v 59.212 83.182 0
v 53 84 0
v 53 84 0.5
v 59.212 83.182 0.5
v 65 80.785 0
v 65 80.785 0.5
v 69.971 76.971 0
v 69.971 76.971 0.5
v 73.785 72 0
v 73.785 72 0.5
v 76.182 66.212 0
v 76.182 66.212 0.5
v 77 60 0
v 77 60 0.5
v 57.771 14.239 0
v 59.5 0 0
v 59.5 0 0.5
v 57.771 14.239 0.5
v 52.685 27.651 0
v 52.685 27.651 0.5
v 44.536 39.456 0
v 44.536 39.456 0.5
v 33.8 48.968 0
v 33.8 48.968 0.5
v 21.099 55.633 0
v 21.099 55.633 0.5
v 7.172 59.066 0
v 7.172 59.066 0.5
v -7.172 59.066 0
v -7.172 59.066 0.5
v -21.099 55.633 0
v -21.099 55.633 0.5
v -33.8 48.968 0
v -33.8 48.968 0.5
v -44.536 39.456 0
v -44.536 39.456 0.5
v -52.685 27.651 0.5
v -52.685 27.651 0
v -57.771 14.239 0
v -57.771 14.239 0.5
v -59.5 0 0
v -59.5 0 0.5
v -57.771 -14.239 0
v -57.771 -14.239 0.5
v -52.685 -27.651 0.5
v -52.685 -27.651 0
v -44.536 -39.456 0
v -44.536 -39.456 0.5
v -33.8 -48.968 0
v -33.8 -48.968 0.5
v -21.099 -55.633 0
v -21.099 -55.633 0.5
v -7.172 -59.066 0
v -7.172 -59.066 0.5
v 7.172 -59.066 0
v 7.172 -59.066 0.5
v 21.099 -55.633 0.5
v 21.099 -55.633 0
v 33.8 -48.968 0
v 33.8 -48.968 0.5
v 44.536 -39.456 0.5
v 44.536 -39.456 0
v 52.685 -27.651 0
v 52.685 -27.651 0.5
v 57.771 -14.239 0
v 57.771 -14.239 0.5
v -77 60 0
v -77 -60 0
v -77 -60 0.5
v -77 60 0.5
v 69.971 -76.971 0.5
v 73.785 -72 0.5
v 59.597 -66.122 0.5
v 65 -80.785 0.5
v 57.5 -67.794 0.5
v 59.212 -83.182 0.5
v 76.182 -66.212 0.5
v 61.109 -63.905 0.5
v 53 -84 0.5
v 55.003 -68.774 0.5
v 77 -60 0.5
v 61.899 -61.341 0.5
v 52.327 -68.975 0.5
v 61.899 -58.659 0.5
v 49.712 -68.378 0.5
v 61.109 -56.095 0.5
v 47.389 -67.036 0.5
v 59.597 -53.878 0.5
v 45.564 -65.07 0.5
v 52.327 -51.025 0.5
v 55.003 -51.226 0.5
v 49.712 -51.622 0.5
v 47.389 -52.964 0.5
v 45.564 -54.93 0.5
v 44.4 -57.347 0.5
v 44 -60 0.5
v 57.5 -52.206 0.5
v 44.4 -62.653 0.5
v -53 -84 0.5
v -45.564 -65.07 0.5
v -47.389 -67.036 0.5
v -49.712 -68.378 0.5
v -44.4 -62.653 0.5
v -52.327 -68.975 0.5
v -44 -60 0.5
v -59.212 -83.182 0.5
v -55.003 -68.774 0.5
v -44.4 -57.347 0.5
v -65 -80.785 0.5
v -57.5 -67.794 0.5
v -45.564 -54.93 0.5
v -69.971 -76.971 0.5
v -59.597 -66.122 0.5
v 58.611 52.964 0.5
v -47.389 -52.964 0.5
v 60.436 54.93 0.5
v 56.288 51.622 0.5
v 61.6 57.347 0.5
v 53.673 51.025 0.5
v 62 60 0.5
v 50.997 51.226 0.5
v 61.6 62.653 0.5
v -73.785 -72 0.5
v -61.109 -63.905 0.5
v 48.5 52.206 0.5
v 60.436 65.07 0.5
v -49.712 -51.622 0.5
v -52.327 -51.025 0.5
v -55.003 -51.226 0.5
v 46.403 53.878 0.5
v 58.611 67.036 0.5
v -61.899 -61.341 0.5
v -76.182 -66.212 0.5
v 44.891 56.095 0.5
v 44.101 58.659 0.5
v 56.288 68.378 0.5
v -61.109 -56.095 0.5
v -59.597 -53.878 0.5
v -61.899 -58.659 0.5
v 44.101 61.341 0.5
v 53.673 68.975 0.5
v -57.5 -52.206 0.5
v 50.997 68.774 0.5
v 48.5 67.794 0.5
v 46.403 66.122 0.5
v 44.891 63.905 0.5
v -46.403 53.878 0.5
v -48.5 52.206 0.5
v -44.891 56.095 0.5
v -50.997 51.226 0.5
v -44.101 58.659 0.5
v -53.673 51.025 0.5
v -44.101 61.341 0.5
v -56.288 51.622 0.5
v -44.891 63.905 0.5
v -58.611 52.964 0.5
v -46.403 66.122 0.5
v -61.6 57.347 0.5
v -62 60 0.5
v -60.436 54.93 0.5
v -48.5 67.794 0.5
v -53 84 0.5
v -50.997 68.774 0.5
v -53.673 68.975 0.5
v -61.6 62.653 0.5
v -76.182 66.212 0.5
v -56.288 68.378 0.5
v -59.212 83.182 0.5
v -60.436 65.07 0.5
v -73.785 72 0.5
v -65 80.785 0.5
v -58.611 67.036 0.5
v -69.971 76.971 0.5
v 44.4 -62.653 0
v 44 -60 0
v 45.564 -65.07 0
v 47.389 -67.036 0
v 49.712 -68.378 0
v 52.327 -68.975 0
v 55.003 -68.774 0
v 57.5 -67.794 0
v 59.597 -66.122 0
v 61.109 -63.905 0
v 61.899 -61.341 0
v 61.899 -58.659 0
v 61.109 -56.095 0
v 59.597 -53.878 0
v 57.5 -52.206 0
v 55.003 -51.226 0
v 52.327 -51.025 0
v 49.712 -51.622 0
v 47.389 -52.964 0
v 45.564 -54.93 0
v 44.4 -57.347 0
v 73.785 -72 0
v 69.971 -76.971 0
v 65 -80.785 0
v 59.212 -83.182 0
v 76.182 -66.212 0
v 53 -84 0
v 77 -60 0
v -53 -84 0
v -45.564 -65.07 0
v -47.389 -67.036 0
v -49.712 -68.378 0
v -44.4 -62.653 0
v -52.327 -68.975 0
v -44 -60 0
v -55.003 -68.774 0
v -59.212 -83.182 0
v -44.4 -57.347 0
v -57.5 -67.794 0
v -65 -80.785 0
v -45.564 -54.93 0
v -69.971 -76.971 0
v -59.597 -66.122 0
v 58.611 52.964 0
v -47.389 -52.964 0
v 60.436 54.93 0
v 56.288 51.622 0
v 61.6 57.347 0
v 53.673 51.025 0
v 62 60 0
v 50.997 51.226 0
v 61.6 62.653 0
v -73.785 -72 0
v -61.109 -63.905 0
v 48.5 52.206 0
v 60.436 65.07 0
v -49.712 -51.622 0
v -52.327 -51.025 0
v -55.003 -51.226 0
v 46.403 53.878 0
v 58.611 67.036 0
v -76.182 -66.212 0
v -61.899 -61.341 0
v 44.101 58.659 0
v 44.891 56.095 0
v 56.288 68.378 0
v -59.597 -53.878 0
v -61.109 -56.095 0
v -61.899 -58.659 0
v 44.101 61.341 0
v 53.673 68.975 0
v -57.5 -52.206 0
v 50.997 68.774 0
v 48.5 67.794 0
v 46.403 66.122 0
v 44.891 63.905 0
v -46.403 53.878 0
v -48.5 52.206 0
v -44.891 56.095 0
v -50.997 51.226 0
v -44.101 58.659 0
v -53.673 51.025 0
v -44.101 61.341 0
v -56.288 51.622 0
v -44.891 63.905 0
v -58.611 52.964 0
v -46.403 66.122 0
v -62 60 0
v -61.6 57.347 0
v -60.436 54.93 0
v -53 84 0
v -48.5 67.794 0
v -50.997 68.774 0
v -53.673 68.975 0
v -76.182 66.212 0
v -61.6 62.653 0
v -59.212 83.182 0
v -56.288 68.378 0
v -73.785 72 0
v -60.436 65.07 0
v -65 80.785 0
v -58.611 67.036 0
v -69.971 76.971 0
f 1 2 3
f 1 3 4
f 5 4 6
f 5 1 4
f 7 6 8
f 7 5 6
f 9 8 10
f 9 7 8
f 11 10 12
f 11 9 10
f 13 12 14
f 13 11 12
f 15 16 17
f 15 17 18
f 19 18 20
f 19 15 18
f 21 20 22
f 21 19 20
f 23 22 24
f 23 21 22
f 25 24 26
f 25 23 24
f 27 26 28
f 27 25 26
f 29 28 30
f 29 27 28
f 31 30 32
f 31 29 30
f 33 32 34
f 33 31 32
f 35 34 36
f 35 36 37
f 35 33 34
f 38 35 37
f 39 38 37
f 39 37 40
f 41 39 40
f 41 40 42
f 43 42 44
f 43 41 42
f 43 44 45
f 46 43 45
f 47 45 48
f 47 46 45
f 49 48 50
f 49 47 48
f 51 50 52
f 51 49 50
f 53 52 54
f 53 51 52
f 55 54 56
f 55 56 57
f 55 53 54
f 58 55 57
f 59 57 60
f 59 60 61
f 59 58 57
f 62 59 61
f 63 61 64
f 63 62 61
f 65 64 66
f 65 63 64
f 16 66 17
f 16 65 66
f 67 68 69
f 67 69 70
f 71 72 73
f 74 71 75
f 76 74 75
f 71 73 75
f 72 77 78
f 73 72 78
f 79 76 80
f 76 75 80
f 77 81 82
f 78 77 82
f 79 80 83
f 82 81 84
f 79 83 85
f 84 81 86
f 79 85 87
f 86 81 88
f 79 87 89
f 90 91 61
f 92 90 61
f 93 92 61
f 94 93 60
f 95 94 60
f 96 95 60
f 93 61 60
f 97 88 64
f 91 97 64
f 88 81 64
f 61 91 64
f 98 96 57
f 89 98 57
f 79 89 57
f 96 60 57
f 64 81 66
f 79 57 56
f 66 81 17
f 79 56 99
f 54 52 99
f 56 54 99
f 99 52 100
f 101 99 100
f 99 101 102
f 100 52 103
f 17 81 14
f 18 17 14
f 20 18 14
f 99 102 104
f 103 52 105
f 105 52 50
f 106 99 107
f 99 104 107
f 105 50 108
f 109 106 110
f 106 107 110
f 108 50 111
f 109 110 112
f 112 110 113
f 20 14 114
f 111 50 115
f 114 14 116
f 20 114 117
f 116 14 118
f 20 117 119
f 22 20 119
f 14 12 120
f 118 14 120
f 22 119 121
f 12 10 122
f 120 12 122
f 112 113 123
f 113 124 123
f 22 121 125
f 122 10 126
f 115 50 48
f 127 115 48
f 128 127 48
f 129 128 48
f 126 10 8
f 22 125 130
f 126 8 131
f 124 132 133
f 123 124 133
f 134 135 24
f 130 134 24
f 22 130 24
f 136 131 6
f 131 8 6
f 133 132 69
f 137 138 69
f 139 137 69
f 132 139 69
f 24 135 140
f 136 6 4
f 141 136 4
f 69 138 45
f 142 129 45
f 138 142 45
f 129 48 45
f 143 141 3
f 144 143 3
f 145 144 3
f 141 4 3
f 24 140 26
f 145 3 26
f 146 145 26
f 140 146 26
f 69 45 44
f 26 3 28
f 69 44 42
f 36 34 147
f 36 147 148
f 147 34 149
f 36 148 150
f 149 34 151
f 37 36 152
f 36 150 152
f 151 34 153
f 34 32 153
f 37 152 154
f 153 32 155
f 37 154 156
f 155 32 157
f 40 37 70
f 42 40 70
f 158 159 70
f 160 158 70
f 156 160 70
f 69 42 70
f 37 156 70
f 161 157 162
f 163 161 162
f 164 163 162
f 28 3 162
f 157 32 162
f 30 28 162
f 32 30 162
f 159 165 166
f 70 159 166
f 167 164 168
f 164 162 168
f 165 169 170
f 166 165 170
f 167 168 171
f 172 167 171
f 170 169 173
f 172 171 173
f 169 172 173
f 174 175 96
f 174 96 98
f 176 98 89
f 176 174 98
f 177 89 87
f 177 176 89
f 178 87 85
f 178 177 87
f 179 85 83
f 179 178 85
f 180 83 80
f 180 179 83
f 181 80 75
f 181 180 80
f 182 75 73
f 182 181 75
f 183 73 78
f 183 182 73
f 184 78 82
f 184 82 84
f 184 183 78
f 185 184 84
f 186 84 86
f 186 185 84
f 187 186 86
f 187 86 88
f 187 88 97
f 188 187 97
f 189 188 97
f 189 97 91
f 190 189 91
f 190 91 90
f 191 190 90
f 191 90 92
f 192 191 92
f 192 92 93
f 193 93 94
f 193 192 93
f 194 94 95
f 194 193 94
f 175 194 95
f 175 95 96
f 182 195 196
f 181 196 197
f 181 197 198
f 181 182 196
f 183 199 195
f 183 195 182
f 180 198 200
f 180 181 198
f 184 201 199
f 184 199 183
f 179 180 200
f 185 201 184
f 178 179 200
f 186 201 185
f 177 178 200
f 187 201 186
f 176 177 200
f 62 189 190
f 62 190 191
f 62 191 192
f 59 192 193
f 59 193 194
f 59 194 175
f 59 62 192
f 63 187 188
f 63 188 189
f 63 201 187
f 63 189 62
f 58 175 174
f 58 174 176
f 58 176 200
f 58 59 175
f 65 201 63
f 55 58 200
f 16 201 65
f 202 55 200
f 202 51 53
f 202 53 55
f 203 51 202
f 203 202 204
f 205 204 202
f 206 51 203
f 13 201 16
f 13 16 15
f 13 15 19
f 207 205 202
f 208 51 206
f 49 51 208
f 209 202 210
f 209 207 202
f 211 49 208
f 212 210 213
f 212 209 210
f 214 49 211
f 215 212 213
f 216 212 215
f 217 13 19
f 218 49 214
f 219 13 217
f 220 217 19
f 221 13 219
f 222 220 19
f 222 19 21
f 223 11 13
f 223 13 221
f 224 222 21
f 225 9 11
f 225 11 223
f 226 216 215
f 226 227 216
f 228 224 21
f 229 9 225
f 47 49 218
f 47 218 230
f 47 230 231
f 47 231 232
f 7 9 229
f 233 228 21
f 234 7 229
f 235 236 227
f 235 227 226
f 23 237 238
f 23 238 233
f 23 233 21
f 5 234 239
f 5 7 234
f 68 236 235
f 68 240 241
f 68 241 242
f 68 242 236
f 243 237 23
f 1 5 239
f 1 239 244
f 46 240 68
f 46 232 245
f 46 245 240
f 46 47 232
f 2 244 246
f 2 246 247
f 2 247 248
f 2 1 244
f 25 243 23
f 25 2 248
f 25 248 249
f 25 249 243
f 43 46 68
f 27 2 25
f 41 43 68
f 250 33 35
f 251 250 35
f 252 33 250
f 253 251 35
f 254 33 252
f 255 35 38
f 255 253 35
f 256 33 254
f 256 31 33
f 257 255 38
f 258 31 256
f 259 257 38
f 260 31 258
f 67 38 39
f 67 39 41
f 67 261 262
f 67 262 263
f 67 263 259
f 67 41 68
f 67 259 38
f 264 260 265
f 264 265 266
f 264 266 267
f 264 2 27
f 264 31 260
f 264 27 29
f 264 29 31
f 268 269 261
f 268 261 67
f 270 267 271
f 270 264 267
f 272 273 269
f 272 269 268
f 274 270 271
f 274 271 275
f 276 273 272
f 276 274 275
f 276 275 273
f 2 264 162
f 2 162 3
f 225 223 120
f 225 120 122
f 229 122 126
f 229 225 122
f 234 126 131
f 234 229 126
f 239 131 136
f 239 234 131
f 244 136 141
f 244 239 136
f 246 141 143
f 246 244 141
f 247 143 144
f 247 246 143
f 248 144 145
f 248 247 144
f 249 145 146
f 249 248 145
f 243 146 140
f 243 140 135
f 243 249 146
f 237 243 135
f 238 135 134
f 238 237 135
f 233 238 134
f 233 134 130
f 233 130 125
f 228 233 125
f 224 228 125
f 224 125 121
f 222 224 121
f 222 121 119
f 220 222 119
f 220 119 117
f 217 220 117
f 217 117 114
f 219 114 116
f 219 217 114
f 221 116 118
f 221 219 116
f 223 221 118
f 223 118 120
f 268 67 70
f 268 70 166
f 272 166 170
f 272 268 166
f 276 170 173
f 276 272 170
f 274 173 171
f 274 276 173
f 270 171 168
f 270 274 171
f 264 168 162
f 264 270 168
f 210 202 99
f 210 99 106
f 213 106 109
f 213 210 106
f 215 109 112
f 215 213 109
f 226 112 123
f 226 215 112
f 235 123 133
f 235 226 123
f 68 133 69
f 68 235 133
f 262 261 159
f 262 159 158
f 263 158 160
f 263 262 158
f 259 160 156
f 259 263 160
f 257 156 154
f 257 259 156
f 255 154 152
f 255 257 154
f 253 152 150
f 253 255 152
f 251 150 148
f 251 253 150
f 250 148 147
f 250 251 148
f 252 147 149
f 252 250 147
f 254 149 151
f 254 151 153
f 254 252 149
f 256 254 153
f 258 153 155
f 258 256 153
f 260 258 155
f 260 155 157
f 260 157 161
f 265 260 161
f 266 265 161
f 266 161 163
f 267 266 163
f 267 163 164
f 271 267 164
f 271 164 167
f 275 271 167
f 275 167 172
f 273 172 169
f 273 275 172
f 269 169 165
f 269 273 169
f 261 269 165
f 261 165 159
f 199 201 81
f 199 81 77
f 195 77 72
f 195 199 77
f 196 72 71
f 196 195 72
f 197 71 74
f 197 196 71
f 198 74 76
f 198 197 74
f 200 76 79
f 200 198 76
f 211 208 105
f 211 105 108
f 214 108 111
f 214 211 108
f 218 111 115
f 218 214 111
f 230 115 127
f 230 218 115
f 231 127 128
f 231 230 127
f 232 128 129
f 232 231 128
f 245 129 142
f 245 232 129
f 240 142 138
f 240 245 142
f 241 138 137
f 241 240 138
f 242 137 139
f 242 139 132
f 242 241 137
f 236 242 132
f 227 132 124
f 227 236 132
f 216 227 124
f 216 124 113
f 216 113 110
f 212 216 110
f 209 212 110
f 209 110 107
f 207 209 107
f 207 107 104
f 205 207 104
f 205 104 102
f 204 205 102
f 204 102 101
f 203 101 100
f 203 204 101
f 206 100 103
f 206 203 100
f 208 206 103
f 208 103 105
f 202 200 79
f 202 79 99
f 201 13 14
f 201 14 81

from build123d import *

# Parameters (mm, degrees)
SKETCH1_R           = 9
SKETCH1_R_2         = 59.5
BOSS_EXTRUDE1_DEPTH = 0.5


with BuildPart() as part:
    # Sketch1 → Boss-Extrude1 (new body)
    with BuildSketch(Plane.XY):
        with BuildLine():
            Line((-53, 84), (53, 84))
            ThreePointArc((53, 84), (69.970562748, 76.970562748), (77, 60))
            Line((77, 60), (77, -60))
            ThreePointArc((77, -60), (69.970562748, -76.970562748), (53, -84))
            Line((53, -84), (-53, -84))
            ThreePointArc((-53, -84), (-69.970562748, -76.970562748), (-77, -60))
            Line((-77, -60), (-77, 60))
            ThreePointArc((-77, 60), (-69.970562748, 76.970562748), (-53, 84))
        make_face()
        with Locations((53, 60)):
            Circle(SKETCH1_R, mode=Mode.SUBTRACT)
        with Locations(Location((-53, 60, 0), (0, 0, 180))):
            Circle(SKETCH1_R, mode=Mode.SUBTRACT)
        with Locations(Location((53, -60, 0), (0, 0, 180))):
            Circle(SKETCH1_R, mode=Mode.SUBTRACT)
        with Locations((-53, -60)):
            Circle(SKETCH1_R, mode=Mode.SUBTRACT)
        Circle(SKETCH1_R_2, mode=Mode.SUBTRACT)
    extrude(amount=BOSS_EXTRUDE1_DEPTH)


solid = part.part
